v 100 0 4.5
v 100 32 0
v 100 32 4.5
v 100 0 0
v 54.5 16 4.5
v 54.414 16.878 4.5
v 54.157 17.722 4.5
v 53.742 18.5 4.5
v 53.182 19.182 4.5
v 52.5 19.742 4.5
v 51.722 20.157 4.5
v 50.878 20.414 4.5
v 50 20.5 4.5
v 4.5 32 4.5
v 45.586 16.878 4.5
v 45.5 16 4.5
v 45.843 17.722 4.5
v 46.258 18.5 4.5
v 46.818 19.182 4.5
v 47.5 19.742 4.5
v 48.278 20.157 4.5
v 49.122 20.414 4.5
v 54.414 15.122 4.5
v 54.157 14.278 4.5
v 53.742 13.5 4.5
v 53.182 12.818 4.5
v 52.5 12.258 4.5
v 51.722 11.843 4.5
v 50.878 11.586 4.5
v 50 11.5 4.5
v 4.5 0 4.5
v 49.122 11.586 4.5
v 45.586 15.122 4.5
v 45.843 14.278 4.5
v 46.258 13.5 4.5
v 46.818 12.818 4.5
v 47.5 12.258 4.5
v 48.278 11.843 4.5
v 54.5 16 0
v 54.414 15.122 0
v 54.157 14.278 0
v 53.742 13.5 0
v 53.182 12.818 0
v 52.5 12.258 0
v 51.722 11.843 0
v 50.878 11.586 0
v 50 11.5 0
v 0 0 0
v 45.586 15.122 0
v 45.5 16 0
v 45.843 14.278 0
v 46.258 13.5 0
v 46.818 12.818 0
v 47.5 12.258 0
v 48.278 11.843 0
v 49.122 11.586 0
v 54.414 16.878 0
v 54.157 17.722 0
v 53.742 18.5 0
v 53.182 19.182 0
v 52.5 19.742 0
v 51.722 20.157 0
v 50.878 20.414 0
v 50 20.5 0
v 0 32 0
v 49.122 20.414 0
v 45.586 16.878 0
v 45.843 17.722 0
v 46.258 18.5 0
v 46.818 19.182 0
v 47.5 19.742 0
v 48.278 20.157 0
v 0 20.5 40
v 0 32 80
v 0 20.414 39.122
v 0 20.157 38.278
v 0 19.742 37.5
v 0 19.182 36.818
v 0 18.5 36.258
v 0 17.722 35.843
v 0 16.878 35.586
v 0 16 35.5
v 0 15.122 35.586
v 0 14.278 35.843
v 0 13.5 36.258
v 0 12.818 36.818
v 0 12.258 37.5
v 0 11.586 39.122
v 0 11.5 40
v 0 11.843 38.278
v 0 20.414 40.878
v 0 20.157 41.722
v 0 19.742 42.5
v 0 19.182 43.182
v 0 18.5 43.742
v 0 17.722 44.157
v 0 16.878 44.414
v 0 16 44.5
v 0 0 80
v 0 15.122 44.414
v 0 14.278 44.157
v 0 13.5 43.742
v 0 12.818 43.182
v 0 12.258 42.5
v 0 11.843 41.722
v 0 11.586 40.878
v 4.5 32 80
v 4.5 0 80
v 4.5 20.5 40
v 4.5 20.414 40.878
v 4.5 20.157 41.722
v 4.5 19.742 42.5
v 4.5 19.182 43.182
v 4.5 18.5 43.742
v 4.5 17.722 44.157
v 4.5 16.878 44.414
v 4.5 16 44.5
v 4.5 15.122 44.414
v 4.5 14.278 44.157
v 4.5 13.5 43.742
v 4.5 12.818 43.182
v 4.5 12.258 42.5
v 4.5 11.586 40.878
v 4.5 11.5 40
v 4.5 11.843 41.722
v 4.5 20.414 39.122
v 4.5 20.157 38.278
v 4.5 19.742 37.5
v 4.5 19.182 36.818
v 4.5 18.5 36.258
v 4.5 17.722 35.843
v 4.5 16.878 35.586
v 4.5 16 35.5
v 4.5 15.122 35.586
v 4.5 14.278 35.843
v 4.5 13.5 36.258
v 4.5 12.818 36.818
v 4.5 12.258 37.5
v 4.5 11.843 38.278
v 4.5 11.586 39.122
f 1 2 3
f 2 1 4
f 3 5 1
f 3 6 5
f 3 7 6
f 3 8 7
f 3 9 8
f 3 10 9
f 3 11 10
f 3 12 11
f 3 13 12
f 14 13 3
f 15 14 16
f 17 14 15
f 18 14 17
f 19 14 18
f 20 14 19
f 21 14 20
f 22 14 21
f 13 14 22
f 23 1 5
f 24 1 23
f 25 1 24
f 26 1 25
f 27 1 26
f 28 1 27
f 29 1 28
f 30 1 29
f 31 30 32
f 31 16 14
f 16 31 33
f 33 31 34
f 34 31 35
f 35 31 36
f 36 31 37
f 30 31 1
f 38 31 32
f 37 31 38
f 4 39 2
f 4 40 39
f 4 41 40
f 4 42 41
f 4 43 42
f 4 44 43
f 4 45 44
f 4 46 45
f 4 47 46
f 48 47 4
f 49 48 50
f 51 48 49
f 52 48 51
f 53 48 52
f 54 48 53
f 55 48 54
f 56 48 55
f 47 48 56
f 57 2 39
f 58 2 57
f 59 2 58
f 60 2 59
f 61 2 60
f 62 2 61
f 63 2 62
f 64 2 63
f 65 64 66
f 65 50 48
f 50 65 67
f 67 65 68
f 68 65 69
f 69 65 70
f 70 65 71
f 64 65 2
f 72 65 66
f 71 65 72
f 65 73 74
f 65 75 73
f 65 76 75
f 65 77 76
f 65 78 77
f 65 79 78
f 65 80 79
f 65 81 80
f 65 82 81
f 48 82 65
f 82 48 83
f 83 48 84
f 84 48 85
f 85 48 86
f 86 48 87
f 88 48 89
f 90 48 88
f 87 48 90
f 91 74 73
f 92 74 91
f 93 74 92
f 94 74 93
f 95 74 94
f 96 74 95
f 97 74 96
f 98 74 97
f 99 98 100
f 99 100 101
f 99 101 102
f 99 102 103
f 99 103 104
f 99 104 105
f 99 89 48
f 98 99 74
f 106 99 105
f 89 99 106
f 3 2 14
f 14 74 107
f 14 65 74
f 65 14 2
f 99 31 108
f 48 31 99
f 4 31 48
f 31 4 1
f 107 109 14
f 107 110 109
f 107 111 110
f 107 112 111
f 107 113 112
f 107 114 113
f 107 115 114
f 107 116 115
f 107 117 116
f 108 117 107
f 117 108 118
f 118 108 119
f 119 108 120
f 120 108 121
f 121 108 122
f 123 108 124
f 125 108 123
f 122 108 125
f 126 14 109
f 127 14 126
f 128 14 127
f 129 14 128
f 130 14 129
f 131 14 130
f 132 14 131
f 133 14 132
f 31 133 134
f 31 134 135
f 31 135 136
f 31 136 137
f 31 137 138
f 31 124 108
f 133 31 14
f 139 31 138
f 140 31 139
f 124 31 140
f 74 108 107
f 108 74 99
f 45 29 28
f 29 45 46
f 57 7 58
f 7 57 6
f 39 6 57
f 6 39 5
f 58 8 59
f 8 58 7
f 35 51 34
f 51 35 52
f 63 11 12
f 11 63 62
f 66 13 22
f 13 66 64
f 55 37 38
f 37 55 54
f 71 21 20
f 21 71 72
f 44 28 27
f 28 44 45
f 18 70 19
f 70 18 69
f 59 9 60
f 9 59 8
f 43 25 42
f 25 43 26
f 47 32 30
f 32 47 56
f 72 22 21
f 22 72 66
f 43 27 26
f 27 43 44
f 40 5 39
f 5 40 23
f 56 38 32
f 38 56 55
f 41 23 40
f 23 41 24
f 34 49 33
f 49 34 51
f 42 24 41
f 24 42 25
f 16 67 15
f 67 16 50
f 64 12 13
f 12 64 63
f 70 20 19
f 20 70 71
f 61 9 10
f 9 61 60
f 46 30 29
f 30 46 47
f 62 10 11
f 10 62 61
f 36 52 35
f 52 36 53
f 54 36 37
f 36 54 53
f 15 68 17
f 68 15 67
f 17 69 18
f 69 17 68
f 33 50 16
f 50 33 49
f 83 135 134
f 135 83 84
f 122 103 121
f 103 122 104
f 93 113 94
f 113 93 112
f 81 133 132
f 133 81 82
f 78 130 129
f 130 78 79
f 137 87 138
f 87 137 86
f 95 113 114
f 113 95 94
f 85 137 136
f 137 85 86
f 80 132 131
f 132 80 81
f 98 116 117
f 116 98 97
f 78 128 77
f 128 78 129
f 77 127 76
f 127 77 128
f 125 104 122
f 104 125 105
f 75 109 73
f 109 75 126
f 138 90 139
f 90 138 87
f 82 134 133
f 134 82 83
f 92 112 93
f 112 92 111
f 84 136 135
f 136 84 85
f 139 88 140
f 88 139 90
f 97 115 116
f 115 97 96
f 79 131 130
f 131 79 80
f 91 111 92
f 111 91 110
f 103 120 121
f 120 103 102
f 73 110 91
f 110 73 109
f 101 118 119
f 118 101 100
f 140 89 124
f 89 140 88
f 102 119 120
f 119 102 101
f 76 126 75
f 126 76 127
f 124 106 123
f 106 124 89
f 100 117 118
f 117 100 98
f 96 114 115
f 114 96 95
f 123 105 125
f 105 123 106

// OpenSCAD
$fn = 32;

// ----------------------------------------------------------------------
// L-bracket: 100 x 32 x 80 mm
// ----------------------------------------------------------------------

// --- parameters (mm) ---
leg_a = 100;              // horizontal leg, X
leg_b = 80;               // vertical leg, Z
depth = 32;               // bracket depth, Y
thick = 4.5;              // plate thickness
hole_d = 9;               // clearance for M8

module hole_z(px, py) {
  translate([px, py, -0.5]) cylinder(h = thick + 1, d = hole_d);
}
module hole_x(pz, py) {
  translate([-0.5, py, pz]) rotate([0, 90, 0]) cylinder(h = thick + 1, d = hole_d);
}

difference() {
  union() {
    /* horizontal leg */
    cube([leg_a, depth, thick]);
    /* vertical leg, overlapping the corner block */
    cube([thick, depth, leg_b]);
  }
  hole_z(50, 16);
  hole_x(40, 16);
}
